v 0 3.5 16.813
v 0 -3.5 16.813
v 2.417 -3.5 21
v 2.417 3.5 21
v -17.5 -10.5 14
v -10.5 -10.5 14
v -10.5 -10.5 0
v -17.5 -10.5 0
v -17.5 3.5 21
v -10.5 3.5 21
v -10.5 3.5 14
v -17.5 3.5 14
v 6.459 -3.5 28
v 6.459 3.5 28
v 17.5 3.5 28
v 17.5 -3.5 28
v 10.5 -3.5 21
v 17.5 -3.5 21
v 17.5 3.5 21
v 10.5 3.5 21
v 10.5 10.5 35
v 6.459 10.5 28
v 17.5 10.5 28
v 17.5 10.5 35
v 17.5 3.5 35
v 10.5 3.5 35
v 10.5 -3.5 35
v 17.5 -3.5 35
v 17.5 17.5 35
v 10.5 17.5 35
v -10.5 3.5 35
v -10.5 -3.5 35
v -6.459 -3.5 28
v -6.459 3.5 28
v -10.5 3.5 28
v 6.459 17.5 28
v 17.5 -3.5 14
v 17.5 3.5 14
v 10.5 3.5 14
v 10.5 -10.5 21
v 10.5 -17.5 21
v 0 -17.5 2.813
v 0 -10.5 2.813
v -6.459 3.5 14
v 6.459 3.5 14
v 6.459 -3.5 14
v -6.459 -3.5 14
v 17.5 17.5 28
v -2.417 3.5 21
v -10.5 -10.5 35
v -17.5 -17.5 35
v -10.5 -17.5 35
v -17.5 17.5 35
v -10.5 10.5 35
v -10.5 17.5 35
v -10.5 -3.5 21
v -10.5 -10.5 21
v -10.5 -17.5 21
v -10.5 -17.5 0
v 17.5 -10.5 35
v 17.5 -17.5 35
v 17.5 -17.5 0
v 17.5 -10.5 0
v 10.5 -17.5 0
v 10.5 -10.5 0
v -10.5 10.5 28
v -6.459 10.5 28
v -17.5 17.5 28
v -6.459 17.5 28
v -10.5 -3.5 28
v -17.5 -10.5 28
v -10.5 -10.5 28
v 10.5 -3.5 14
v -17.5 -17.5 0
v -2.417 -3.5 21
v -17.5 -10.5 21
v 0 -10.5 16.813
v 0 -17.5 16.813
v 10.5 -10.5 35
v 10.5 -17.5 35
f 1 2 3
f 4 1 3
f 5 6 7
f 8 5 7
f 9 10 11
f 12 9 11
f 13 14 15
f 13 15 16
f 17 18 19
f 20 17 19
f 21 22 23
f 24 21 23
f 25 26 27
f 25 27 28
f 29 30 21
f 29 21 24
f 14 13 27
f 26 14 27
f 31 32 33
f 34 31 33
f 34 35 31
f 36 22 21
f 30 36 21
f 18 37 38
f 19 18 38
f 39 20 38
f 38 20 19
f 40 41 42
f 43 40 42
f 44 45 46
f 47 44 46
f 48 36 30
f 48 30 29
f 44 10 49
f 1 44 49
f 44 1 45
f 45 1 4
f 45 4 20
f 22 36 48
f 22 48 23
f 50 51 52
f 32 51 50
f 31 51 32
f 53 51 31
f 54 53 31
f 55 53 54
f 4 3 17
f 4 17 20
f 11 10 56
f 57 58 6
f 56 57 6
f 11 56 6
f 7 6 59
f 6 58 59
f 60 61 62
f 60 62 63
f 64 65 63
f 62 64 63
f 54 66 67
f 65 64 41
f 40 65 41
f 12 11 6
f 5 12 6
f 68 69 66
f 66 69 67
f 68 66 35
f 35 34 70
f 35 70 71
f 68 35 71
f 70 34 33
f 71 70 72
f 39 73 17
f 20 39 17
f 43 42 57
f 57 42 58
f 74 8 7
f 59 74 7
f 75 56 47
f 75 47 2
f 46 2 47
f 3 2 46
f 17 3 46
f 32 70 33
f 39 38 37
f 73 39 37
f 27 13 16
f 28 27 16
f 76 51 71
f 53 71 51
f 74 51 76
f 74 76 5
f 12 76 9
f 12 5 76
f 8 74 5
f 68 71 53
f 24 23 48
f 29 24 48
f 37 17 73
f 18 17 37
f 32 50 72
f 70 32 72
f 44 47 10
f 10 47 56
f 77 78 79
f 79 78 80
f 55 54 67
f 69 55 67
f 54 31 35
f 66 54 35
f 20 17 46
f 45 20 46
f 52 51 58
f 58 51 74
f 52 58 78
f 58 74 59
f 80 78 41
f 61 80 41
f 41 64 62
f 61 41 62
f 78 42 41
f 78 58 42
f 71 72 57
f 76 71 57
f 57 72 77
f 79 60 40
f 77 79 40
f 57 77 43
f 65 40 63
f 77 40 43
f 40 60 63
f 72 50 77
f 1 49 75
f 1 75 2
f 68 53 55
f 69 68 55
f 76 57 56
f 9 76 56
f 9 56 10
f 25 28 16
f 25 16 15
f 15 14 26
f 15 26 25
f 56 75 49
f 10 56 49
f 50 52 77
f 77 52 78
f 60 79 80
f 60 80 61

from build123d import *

# Parameters (mm, degrees)
F0_W     = 35
F0_H     = 35
F1_DEPTH = 35
F2_W     = 28
F2_H     = 7
F5_DEPTH = 35
F6_DEPTH = 35
F7_DEPTH = 35
F8_DEPTH = 35
F9_DEPTH = 35


with BuildPart() as f1:
    # F0 (on Top) → F1 (new body)
    with BuildSketch(Plane.XY):
        Rectangle(F0_W, F0_H)
    extrude(amount=F1_DEPTH)

    # F2 (on face) → F5 (cut)
    with BuildSketch(Plane.XY.offset(35)):
        with Locations((3.5, 7)):
            Rectangle(F2_W, F2_H)
    extrude(amount=-F5_DEPTH, mode=Mode.SUBTRACT)

    # F2 (on face) → F6 (cut)
    with BuildSketch(Plane.XY.offset(35)):
        with Locations((3.5, -7)):
            Rectangle(F2_W, F2_H)
    extrude(amount=-F6_DEPTH, mode=Mode.SUBTRACT)

    # F3 (on face) → F7 (cut)
    with BuildSketch(Plane.XZ.offset(17.5)):
        Polygon((10.5, 35), (-10.5, 35), (0, 16.8134665205), align=None)
    extrude(amount=-F7_DEPTH, mode=Mode.SUBTRACT)

    # F3 (on face) → F8 (cut)
    with BuildSketch(Plane.XZ.offset(17.5)):
        Polygon((-10.5, 21), (-10.5, 0), (10.5, 0), (10.5, 21), (0, 2.8134665205), align=None)
    extrude(amount=-F8_DEPTH, mode=Mode.SUBTRACT)

    # F4 (on face) → F9 (cut)
    with BuildSketch(Plane.YZ.offset(17.5)):
        Polygon((17.5, 28), (-10.5, 28), (-10.5, 21), (3.5, 21), (3.5, 14), (-10.5, 14), (-10.5, 0), (17.5, 0), align=None)
    extrude(amount=-F9_DEPTH, mode=Mode.SUBTRACT)


solid = f1.part
